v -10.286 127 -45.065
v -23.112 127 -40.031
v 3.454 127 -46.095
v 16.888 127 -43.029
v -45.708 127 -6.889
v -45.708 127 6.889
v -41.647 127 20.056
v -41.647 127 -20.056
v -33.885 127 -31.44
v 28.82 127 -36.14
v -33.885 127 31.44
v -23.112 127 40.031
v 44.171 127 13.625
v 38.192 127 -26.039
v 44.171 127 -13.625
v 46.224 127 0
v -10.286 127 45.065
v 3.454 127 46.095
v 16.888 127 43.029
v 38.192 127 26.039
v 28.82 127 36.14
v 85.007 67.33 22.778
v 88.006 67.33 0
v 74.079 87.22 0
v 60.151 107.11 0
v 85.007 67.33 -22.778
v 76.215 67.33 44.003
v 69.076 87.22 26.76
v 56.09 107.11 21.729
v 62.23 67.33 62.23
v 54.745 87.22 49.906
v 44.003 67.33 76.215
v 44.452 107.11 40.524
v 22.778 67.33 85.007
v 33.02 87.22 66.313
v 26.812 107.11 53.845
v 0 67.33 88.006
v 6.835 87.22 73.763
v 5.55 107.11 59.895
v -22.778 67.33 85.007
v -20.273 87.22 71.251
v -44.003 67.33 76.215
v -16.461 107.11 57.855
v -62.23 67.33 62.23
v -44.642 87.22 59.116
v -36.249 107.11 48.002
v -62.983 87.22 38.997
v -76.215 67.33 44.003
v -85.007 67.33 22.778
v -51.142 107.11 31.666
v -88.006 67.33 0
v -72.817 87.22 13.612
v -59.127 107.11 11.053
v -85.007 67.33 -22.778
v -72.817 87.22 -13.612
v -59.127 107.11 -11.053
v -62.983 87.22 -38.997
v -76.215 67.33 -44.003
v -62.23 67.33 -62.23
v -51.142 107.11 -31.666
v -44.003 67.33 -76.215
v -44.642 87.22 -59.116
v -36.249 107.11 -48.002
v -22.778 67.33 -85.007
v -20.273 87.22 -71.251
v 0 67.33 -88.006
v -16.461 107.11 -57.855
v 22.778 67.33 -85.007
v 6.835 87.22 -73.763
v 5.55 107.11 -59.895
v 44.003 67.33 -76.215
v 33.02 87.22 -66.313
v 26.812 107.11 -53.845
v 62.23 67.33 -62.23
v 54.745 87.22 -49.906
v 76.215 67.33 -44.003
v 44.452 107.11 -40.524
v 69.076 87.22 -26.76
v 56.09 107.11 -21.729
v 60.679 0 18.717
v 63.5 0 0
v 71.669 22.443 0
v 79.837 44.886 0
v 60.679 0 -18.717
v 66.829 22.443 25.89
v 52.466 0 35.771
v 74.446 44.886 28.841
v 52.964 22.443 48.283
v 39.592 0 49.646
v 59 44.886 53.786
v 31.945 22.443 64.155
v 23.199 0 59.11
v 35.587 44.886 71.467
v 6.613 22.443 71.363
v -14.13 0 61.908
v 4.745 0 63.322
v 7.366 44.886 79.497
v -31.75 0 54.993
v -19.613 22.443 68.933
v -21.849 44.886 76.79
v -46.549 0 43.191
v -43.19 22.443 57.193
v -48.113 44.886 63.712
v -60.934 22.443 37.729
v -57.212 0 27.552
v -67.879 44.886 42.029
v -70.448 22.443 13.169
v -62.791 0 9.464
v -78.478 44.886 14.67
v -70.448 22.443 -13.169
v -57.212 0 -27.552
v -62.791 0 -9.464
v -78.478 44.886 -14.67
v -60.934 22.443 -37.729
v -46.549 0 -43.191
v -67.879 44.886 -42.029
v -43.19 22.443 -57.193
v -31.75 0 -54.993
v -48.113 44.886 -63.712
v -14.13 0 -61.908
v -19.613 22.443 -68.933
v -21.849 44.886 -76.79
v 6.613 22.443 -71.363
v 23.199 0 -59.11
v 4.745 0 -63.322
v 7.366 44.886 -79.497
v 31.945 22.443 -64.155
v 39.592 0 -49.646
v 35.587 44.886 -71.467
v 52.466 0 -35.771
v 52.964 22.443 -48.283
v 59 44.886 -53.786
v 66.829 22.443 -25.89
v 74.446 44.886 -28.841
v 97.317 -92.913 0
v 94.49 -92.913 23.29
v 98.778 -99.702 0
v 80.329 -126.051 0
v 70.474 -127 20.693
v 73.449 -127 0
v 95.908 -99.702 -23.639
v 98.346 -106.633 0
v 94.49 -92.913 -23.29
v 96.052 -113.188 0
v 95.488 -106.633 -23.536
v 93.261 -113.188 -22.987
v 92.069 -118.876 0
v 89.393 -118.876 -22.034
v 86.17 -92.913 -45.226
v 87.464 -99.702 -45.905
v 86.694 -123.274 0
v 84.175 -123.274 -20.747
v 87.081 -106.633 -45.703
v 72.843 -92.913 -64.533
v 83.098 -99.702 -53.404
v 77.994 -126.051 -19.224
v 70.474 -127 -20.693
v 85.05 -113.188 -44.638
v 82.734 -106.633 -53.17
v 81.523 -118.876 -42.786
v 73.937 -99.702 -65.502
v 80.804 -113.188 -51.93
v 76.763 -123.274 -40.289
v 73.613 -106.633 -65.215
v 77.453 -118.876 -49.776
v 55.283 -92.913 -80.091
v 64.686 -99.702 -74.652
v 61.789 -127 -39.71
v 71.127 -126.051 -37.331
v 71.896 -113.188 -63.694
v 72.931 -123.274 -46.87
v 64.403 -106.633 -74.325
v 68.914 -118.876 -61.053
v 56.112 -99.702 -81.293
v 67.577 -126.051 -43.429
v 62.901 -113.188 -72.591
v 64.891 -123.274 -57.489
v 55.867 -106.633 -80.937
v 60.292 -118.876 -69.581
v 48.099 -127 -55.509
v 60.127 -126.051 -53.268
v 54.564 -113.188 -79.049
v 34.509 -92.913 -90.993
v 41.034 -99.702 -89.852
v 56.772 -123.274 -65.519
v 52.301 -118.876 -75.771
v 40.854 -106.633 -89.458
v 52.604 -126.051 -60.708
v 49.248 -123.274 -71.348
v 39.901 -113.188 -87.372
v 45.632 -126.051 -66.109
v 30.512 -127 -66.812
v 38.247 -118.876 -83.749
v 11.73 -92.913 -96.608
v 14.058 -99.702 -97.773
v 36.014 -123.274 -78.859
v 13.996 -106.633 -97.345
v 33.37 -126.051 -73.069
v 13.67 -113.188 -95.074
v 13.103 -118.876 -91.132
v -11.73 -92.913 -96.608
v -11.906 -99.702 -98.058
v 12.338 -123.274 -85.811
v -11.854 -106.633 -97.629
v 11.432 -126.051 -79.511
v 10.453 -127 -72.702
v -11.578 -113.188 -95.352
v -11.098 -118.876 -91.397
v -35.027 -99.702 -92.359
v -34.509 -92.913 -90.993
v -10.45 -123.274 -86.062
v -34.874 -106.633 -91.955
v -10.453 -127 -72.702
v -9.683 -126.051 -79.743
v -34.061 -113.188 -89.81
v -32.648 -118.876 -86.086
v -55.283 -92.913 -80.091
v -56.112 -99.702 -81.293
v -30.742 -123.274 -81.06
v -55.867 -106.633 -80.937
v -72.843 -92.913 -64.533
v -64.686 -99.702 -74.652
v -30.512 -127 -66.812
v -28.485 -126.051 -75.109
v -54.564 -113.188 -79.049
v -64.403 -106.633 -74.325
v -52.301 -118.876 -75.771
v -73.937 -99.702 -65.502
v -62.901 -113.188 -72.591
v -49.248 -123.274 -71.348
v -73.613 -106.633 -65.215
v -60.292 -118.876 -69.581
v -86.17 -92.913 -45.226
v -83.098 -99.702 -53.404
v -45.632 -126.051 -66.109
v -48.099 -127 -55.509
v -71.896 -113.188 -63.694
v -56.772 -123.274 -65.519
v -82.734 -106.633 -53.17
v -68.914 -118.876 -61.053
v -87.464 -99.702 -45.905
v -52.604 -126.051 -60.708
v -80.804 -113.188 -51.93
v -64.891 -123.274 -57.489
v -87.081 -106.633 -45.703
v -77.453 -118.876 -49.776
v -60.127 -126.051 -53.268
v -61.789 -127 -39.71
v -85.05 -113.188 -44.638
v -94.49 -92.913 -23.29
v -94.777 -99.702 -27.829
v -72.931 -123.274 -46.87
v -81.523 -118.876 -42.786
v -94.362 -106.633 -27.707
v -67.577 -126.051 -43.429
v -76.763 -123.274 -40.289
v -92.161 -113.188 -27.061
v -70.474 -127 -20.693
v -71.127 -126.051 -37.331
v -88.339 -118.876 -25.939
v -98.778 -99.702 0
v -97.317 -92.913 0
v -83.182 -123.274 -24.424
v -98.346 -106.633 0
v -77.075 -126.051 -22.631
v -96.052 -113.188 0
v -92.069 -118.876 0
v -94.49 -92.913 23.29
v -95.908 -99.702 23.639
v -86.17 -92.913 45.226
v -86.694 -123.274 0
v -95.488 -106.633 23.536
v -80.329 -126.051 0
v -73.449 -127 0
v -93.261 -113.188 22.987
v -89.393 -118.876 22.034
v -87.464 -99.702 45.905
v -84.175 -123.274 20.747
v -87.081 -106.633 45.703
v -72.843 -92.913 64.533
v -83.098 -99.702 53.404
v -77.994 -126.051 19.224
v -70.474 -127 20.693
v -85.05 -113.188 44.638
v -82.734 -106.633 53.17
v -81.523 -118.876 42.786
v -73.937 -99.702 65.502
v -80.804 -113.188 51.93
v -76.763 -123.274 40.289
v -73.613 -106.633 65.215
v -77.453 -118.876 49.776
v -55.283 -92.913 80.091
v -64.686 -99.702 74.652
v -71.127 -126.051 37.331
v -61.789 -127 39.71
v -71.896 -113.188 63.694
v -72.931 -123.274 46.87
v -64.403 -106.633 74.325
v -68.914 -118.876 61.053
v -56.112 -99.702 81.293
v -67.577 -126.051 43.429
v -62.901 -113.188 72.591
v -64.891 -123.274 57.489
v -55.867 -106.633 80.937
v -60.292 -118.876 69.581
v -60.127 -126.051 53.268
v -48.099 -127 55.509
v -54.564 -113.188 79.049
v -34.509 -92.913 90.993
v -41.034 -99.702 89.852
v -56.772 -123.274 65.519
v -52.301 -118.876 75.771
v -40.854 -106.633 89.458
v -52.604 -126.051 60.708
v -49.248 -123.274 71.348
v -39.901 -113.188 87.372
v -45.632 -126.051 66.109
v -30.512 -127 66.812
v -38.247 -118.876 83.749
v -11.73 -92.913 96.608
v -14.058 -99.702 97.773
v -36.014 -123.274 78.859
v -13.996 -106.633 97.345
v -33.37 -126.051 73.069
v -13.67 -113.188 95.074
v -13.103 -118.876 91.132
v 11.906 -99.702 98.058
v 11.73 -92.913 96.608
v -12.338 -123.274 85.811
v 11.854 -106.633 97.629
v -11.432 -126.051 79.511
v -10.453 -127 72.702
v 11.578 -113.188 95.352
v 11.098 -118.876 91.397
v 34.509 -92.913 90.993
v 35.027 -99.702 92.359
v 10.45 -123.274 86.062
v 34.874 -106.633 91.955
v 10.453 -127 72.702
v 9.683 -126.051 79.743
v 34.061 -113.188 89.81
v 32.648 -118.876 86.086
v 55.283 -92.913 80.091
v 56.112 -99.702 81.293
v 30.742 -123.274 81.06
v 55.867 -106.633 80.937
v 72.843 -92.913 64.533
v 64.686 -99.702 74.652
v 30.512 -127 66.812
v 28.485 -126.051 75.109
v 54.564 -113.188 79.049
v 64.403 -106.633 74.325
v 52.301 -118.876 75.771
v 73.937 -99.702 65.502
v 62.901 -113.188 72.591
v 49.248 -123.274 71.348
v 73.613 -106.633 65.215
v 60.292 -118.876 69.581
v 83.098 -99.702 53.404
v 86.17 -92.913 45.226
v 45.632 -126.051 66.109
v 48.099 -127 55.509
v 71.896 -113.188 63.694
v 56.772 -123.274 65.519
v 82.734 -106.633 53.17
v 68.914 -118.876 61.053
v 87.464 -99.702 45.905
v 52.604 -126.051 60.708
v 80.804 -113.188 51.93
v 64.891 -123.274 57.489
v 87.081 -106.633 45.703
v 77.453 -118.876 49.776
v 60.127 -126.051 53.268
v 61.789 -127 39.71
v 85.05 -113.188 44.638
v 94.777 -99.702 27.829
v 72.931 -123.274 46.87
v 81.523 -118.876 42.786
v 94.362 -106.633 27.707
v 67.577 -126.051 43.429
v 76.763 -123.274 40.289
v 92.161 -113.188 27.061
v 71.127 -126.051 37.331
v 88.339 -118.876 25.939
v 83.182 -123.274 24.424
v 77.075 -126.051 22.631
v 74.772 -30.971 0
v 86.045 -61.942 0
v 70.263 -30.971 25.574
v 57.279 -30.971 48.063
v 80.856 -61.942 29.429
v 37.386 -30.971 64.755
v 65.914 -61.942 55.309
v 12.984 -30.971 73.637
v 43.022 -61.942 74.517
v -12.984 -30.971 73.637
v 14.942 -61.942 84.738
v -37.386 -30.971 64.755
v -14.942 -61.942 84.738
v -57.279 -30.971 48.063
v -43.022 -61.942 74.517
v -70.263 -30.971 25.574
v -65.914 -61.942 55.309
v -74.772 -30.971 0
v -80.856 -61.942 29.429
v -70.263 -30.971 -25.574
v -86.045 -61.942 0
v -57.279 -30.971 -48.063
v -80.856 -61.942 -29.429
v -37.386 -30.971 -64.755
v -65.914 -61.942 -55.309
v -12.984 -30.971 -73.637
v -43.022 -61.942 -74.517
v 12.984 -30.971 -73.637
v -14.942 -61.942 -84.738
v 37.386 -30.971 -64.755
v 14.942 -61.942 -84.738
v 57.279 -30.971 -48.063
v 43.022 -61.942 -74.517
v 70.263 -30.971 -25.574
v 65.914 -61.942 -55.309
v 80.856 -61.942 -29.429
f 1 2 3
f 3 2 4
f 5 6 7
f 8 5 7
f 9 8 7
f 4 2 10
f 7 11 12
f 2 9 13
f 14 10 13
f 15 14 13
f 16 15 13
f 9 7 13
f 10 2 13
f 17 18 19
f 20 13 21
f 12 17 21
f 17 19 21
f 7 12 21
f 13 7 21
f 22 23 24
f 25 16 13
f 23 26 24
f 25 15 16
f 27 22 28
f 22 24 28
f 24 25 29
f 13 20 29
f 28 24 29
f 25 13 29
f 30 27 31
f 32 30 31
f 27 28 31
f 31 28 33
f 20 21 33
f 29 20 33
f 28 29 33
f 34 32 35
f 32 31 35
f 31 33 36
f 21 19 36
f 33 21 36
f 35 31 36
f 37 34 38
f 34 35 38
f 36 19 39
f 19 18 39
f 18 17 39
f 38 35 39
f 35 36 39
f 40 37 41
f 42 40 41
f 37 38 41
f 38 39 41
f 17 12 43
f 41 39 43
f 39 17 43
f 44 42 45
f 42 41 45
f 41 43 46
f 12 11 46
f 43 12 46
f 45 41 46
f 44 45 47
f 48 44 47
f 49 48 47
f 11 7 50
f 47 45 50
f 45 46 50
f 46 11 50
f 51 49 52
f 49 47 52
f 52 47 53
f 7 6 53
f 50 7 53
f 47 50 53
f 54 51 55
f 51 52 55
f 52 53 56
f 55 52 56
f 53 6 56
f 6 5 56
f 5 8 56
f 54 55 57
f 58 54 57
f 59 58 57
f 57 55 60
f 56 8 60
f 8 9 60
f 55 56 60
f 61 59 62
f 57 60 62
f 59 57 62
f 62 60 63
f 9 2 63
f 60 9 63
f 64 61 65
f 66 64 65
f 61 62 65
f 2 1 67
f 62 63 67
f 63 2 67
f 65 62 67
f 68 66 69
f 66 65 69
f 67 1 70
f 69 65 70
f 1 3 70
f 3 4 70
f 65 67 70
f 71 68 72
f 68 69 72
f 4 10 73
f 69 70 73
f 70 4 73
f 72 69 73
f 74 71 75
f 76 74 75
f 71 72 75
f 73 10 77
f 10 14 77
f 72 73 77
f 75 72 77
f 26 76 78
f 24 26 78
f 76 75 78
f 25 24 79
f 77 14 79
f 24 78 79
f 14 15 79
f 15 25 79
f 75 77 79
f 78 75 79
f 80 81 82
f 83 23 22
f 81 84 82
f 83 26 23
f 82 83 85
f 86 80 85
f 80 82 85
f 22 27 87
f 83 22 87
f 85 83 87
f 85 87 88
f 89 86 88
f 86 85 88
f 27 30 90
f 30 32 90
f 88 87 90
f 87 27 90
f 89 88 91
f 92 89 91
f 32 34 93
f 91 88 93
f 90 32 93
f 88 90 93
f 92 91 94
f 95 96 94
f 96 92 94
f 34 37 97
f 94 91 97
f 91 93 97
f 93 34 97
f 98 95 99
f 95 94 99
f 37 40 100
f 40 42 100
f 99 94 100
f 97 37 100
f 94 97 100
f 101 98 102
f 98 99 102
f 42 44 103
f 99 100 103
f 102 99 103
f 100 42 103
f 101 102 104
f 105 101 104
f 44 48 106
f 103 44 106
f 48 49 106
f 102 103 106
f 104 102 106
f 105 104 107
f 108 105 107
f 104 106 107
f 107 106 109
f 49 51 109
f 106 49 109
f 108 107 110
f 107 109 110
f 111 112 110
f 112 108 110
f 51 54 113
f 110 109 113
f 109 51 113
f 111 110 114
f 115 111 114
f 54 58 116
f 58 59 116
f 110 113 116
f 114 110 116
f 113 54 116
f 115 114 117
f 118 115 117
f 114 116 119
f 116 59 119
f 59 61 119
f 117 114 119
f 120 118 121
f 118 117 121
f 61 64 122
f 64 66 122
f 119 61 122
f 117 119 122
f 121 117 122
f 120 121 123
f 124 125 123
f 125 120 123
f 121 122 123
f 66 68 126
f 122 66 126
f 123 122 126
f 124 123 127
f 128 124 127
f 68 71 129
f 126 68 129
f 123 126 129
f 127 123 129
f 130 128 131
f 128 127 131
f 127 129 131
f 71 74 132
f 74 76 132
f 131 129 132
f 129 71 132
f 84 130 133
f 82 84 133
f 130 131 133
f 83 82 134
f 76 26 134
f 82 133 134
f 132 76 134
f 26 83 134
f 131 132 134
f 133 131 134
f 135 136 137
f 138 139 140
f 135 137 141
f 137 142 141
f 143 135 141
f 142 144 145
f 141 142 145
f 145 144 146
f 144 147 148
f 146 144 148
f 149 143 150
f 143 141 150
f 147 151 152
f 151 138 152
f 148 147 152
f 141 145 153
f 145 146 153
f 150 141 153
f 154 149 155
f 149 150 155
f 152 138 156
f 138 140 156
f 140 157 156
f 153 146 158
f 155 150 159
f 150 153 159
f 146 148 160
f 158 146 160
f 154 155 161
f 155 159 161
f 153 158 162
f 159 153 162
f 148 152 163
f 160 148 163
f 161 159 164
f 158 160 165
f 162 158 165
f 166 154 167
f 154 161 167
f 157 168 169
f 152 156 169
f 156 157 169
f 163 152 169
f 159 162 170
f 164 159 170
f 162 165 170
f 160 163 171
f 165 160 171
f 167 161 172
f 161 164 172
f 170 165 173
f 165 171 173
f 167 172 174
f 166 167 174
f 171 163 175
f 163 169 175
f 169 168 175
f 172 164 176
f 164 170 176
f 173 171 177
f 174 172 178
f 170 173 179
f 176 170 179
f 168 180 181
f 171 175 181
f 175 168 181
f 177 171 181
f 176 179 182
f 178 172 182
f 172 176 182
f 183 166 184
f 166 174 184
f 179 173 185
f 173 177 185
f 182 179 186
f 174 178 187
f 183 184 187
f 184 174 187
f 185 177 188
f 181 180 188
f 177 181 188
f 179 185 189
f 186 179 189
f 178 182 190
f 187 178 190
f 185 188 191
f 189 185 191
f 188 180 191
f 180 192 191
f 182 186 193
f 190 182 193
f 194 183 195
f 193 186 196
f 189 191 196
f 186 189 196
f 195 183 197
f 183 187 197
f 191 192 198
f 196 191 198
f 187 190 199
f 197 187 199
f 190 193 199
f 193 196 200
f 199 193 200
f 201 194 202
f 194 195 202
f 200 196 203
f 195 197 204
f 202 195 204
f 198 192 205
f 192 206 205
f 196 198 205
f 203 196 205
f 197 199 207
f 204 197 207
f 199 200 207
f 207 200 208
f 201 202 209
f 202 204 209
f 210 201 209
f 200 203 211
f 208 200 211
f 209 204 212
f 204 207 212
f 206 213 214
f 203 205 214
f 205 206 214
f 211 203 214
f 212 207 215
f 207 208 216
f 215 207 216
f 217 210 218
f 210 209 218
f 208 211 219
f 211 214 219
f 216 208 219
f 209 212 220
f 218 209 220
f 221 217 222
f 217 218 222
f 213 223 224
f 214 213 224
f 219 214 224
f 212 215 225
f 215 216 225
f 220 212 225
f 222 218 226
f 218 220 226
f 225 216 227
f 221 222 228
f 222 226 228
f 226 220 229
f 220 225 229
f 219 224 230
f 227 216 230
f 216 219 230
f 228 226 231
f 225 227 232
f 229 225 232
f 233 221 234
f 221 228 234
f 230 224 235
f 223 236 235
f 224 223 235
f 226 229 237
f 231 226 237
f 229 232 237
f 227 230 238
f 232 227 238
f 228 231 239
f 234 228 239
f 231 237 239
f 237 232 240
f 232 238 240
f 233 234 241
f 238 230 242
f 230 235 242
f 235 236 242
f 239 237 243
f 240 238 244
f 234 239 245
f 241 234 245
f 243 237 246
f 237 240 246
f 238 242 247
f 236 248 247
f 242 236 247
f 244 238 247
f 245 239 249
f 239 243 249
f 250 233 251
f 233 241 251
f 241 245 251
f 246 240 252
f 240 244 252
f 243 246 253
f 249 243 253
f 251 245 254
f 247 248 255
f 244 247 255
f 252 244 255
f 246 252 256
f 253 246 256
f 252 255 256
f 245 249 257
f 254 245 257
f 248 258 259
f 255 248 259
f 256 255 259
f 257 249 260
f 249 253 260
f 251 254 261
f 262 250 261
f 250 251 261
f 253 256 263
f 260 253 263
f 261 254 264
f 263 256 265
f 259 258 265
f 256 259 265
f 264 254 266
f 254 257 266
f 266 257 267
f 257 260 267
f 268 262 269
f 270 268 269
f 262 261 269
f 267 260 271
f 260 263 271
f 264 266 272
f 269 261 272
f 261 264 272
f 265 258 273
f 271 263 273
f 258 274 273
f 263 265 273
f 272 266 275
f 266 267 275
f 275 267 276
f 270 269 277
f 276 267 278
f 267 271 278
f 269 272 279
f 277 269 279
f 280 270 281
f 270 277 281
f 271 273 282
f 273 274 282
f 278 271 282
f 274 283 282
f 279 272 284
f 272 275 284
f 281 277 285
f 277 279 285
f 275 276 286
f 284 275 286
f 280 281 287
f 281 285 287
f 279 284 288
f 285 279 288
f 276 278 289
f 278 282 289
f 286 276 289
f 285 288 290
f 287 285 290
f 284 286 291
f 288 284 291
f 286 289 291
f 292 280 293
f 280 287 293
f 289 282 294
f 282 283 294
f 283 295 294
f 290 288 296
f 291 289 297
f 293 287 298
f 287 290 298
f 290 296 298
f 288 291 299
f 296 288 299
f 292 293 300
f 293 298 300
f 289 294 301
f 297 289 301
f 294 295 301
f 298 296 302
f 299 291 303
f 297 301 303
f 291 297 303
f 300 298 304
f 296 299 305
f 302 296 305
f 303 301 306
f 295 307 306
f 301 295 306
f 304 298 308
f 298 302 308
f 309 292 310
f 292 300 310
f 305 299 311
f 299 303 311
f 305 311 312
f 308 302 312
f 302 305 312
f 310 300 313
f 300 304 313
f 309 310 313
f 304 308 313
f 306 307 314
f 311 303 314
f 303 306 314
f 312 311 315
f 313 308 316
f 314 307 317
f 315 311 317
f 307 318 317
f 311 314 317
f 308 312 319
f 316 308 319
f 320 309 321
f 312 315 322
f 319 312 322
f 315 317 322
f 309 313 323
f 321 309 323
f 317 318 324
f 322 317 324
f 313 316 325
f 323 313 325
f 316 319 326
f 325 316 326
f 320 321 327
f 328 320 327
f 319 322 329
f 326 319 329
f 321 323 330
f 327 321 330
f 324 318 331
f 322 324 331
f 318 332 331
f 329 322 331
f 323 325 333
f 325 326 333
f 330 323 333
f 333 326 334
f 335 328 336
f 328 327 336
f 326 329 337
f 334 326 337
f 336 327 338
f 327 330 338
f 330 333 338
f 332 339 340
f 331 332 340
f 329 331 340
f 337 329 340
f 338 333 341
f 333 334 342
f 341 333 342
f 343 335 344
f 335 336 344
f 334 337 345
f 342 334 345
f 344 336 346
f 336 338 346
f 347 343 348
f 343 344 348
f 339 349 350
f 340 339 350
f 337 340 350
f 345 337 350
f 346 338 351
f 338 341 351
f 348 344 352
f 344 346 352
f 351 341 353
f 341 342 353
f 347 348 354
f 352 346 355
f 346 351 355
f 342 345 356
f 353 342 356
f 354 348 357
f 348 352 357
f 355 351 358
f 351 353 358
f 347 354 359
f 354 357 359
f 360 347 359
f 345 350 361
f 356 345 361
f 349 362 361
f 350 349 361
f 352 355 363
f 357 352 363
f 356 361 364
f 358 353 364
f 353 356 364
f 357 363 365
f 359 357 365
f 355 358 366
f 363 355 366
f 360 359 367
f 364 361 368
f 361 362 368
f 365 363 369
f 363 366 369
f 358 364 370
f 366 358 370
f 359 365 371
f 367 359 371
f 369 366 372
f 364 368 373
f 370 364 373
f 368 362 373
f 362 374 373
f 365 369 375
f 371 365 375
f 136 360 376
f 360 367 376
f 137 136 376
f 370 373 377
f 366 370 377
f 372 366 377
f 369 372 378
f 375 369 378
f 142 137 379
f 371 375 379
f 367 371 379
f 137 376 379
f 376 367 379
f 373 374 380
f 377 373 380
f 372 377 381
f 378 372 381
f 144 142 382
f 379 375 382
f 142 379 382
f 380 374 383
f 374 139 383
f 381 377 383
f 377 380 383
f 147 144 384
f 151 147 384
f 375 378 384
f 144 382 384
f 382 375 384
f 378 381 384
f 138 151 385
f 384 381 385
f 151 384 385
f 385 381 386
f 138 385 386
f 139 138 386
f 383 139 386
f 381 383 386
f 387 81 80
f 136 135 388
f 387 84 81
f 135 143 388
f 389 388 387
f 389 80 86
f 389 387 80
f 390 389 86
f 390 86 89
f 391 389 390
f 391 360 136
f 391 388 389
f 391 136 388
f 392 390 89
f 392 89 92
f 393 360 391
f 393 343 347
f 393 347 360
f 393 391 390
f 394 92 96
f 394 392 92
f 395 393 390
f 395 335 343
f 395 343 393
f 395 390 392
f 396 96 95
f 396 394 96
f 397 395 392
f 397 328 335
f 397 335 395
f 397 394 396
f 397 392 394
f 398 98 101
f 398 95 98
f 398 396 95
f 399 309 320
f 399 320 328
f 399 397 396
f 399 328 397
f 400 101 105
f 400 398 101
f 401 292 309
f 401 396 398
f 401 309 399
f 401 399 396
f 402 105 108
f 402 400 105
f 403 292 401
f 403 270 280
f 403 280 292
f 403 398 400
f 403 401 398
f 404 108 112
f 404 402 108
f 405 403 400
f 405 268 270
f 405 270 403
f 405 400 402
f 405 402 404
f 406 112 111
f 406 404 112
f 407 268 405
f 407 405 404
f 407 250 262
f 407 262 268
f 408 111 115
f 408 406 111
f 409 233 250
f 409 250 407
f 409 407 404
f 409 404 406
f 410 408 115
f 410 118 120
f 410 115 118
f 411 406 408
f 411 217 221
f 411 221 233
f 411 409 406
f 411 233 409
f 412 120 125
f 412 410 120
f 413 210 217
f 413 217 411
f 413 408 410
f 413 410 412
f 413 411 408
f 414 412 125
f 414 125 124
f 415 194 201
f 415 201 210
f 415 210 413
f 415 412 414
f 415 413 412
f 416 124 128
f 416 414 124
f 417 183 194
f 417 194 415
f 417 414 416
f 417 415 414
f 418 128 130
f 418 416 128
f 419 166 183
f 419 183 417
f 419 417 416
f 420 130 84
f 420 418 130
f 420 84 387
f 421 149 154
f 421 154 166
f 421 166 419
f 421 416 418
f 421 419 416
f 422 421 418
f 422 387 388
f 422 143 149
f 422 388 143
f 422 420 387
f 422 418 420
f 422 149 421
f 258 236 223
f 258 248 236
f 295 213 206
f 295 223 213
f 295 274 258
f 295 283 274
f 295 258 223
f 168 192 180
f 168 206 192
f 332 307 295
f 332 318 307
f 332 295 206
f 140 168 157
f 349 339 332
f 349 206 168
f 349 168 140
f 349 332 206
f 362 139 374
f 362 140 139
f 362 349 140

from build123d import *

# Parameters (mm, degrees)
F0_R     = 63.5
F1_DEPTH = 127
F1_TAPER = -20
F2_SIZE  = 63.5
F3_R     = 25.4


with BuildPart() as f1:
    # F0 (on Front) → F1 (new body, symmetric)
    with BuildSketch(Plane.XZ):
        Circle(F0_R)
    extrude(amount=F1_DEPTH, both=True, taper=F1_TAPER)

    # F2
    f2_edges = [f1.edges().sort_by_distance(p)[0] for p in [
        (-109.72422, 127, 0),
    ]]
    chamfer(f2_edges, length=F2_SIZE)

    # F3
    f3_edges = [f1.edges().sort_by_distance(p)[0] for p in [
        (-109.72422, -127, 0),
    ]]
    fillet(f3_edges, radius=F3_R)


solid = f1.part
